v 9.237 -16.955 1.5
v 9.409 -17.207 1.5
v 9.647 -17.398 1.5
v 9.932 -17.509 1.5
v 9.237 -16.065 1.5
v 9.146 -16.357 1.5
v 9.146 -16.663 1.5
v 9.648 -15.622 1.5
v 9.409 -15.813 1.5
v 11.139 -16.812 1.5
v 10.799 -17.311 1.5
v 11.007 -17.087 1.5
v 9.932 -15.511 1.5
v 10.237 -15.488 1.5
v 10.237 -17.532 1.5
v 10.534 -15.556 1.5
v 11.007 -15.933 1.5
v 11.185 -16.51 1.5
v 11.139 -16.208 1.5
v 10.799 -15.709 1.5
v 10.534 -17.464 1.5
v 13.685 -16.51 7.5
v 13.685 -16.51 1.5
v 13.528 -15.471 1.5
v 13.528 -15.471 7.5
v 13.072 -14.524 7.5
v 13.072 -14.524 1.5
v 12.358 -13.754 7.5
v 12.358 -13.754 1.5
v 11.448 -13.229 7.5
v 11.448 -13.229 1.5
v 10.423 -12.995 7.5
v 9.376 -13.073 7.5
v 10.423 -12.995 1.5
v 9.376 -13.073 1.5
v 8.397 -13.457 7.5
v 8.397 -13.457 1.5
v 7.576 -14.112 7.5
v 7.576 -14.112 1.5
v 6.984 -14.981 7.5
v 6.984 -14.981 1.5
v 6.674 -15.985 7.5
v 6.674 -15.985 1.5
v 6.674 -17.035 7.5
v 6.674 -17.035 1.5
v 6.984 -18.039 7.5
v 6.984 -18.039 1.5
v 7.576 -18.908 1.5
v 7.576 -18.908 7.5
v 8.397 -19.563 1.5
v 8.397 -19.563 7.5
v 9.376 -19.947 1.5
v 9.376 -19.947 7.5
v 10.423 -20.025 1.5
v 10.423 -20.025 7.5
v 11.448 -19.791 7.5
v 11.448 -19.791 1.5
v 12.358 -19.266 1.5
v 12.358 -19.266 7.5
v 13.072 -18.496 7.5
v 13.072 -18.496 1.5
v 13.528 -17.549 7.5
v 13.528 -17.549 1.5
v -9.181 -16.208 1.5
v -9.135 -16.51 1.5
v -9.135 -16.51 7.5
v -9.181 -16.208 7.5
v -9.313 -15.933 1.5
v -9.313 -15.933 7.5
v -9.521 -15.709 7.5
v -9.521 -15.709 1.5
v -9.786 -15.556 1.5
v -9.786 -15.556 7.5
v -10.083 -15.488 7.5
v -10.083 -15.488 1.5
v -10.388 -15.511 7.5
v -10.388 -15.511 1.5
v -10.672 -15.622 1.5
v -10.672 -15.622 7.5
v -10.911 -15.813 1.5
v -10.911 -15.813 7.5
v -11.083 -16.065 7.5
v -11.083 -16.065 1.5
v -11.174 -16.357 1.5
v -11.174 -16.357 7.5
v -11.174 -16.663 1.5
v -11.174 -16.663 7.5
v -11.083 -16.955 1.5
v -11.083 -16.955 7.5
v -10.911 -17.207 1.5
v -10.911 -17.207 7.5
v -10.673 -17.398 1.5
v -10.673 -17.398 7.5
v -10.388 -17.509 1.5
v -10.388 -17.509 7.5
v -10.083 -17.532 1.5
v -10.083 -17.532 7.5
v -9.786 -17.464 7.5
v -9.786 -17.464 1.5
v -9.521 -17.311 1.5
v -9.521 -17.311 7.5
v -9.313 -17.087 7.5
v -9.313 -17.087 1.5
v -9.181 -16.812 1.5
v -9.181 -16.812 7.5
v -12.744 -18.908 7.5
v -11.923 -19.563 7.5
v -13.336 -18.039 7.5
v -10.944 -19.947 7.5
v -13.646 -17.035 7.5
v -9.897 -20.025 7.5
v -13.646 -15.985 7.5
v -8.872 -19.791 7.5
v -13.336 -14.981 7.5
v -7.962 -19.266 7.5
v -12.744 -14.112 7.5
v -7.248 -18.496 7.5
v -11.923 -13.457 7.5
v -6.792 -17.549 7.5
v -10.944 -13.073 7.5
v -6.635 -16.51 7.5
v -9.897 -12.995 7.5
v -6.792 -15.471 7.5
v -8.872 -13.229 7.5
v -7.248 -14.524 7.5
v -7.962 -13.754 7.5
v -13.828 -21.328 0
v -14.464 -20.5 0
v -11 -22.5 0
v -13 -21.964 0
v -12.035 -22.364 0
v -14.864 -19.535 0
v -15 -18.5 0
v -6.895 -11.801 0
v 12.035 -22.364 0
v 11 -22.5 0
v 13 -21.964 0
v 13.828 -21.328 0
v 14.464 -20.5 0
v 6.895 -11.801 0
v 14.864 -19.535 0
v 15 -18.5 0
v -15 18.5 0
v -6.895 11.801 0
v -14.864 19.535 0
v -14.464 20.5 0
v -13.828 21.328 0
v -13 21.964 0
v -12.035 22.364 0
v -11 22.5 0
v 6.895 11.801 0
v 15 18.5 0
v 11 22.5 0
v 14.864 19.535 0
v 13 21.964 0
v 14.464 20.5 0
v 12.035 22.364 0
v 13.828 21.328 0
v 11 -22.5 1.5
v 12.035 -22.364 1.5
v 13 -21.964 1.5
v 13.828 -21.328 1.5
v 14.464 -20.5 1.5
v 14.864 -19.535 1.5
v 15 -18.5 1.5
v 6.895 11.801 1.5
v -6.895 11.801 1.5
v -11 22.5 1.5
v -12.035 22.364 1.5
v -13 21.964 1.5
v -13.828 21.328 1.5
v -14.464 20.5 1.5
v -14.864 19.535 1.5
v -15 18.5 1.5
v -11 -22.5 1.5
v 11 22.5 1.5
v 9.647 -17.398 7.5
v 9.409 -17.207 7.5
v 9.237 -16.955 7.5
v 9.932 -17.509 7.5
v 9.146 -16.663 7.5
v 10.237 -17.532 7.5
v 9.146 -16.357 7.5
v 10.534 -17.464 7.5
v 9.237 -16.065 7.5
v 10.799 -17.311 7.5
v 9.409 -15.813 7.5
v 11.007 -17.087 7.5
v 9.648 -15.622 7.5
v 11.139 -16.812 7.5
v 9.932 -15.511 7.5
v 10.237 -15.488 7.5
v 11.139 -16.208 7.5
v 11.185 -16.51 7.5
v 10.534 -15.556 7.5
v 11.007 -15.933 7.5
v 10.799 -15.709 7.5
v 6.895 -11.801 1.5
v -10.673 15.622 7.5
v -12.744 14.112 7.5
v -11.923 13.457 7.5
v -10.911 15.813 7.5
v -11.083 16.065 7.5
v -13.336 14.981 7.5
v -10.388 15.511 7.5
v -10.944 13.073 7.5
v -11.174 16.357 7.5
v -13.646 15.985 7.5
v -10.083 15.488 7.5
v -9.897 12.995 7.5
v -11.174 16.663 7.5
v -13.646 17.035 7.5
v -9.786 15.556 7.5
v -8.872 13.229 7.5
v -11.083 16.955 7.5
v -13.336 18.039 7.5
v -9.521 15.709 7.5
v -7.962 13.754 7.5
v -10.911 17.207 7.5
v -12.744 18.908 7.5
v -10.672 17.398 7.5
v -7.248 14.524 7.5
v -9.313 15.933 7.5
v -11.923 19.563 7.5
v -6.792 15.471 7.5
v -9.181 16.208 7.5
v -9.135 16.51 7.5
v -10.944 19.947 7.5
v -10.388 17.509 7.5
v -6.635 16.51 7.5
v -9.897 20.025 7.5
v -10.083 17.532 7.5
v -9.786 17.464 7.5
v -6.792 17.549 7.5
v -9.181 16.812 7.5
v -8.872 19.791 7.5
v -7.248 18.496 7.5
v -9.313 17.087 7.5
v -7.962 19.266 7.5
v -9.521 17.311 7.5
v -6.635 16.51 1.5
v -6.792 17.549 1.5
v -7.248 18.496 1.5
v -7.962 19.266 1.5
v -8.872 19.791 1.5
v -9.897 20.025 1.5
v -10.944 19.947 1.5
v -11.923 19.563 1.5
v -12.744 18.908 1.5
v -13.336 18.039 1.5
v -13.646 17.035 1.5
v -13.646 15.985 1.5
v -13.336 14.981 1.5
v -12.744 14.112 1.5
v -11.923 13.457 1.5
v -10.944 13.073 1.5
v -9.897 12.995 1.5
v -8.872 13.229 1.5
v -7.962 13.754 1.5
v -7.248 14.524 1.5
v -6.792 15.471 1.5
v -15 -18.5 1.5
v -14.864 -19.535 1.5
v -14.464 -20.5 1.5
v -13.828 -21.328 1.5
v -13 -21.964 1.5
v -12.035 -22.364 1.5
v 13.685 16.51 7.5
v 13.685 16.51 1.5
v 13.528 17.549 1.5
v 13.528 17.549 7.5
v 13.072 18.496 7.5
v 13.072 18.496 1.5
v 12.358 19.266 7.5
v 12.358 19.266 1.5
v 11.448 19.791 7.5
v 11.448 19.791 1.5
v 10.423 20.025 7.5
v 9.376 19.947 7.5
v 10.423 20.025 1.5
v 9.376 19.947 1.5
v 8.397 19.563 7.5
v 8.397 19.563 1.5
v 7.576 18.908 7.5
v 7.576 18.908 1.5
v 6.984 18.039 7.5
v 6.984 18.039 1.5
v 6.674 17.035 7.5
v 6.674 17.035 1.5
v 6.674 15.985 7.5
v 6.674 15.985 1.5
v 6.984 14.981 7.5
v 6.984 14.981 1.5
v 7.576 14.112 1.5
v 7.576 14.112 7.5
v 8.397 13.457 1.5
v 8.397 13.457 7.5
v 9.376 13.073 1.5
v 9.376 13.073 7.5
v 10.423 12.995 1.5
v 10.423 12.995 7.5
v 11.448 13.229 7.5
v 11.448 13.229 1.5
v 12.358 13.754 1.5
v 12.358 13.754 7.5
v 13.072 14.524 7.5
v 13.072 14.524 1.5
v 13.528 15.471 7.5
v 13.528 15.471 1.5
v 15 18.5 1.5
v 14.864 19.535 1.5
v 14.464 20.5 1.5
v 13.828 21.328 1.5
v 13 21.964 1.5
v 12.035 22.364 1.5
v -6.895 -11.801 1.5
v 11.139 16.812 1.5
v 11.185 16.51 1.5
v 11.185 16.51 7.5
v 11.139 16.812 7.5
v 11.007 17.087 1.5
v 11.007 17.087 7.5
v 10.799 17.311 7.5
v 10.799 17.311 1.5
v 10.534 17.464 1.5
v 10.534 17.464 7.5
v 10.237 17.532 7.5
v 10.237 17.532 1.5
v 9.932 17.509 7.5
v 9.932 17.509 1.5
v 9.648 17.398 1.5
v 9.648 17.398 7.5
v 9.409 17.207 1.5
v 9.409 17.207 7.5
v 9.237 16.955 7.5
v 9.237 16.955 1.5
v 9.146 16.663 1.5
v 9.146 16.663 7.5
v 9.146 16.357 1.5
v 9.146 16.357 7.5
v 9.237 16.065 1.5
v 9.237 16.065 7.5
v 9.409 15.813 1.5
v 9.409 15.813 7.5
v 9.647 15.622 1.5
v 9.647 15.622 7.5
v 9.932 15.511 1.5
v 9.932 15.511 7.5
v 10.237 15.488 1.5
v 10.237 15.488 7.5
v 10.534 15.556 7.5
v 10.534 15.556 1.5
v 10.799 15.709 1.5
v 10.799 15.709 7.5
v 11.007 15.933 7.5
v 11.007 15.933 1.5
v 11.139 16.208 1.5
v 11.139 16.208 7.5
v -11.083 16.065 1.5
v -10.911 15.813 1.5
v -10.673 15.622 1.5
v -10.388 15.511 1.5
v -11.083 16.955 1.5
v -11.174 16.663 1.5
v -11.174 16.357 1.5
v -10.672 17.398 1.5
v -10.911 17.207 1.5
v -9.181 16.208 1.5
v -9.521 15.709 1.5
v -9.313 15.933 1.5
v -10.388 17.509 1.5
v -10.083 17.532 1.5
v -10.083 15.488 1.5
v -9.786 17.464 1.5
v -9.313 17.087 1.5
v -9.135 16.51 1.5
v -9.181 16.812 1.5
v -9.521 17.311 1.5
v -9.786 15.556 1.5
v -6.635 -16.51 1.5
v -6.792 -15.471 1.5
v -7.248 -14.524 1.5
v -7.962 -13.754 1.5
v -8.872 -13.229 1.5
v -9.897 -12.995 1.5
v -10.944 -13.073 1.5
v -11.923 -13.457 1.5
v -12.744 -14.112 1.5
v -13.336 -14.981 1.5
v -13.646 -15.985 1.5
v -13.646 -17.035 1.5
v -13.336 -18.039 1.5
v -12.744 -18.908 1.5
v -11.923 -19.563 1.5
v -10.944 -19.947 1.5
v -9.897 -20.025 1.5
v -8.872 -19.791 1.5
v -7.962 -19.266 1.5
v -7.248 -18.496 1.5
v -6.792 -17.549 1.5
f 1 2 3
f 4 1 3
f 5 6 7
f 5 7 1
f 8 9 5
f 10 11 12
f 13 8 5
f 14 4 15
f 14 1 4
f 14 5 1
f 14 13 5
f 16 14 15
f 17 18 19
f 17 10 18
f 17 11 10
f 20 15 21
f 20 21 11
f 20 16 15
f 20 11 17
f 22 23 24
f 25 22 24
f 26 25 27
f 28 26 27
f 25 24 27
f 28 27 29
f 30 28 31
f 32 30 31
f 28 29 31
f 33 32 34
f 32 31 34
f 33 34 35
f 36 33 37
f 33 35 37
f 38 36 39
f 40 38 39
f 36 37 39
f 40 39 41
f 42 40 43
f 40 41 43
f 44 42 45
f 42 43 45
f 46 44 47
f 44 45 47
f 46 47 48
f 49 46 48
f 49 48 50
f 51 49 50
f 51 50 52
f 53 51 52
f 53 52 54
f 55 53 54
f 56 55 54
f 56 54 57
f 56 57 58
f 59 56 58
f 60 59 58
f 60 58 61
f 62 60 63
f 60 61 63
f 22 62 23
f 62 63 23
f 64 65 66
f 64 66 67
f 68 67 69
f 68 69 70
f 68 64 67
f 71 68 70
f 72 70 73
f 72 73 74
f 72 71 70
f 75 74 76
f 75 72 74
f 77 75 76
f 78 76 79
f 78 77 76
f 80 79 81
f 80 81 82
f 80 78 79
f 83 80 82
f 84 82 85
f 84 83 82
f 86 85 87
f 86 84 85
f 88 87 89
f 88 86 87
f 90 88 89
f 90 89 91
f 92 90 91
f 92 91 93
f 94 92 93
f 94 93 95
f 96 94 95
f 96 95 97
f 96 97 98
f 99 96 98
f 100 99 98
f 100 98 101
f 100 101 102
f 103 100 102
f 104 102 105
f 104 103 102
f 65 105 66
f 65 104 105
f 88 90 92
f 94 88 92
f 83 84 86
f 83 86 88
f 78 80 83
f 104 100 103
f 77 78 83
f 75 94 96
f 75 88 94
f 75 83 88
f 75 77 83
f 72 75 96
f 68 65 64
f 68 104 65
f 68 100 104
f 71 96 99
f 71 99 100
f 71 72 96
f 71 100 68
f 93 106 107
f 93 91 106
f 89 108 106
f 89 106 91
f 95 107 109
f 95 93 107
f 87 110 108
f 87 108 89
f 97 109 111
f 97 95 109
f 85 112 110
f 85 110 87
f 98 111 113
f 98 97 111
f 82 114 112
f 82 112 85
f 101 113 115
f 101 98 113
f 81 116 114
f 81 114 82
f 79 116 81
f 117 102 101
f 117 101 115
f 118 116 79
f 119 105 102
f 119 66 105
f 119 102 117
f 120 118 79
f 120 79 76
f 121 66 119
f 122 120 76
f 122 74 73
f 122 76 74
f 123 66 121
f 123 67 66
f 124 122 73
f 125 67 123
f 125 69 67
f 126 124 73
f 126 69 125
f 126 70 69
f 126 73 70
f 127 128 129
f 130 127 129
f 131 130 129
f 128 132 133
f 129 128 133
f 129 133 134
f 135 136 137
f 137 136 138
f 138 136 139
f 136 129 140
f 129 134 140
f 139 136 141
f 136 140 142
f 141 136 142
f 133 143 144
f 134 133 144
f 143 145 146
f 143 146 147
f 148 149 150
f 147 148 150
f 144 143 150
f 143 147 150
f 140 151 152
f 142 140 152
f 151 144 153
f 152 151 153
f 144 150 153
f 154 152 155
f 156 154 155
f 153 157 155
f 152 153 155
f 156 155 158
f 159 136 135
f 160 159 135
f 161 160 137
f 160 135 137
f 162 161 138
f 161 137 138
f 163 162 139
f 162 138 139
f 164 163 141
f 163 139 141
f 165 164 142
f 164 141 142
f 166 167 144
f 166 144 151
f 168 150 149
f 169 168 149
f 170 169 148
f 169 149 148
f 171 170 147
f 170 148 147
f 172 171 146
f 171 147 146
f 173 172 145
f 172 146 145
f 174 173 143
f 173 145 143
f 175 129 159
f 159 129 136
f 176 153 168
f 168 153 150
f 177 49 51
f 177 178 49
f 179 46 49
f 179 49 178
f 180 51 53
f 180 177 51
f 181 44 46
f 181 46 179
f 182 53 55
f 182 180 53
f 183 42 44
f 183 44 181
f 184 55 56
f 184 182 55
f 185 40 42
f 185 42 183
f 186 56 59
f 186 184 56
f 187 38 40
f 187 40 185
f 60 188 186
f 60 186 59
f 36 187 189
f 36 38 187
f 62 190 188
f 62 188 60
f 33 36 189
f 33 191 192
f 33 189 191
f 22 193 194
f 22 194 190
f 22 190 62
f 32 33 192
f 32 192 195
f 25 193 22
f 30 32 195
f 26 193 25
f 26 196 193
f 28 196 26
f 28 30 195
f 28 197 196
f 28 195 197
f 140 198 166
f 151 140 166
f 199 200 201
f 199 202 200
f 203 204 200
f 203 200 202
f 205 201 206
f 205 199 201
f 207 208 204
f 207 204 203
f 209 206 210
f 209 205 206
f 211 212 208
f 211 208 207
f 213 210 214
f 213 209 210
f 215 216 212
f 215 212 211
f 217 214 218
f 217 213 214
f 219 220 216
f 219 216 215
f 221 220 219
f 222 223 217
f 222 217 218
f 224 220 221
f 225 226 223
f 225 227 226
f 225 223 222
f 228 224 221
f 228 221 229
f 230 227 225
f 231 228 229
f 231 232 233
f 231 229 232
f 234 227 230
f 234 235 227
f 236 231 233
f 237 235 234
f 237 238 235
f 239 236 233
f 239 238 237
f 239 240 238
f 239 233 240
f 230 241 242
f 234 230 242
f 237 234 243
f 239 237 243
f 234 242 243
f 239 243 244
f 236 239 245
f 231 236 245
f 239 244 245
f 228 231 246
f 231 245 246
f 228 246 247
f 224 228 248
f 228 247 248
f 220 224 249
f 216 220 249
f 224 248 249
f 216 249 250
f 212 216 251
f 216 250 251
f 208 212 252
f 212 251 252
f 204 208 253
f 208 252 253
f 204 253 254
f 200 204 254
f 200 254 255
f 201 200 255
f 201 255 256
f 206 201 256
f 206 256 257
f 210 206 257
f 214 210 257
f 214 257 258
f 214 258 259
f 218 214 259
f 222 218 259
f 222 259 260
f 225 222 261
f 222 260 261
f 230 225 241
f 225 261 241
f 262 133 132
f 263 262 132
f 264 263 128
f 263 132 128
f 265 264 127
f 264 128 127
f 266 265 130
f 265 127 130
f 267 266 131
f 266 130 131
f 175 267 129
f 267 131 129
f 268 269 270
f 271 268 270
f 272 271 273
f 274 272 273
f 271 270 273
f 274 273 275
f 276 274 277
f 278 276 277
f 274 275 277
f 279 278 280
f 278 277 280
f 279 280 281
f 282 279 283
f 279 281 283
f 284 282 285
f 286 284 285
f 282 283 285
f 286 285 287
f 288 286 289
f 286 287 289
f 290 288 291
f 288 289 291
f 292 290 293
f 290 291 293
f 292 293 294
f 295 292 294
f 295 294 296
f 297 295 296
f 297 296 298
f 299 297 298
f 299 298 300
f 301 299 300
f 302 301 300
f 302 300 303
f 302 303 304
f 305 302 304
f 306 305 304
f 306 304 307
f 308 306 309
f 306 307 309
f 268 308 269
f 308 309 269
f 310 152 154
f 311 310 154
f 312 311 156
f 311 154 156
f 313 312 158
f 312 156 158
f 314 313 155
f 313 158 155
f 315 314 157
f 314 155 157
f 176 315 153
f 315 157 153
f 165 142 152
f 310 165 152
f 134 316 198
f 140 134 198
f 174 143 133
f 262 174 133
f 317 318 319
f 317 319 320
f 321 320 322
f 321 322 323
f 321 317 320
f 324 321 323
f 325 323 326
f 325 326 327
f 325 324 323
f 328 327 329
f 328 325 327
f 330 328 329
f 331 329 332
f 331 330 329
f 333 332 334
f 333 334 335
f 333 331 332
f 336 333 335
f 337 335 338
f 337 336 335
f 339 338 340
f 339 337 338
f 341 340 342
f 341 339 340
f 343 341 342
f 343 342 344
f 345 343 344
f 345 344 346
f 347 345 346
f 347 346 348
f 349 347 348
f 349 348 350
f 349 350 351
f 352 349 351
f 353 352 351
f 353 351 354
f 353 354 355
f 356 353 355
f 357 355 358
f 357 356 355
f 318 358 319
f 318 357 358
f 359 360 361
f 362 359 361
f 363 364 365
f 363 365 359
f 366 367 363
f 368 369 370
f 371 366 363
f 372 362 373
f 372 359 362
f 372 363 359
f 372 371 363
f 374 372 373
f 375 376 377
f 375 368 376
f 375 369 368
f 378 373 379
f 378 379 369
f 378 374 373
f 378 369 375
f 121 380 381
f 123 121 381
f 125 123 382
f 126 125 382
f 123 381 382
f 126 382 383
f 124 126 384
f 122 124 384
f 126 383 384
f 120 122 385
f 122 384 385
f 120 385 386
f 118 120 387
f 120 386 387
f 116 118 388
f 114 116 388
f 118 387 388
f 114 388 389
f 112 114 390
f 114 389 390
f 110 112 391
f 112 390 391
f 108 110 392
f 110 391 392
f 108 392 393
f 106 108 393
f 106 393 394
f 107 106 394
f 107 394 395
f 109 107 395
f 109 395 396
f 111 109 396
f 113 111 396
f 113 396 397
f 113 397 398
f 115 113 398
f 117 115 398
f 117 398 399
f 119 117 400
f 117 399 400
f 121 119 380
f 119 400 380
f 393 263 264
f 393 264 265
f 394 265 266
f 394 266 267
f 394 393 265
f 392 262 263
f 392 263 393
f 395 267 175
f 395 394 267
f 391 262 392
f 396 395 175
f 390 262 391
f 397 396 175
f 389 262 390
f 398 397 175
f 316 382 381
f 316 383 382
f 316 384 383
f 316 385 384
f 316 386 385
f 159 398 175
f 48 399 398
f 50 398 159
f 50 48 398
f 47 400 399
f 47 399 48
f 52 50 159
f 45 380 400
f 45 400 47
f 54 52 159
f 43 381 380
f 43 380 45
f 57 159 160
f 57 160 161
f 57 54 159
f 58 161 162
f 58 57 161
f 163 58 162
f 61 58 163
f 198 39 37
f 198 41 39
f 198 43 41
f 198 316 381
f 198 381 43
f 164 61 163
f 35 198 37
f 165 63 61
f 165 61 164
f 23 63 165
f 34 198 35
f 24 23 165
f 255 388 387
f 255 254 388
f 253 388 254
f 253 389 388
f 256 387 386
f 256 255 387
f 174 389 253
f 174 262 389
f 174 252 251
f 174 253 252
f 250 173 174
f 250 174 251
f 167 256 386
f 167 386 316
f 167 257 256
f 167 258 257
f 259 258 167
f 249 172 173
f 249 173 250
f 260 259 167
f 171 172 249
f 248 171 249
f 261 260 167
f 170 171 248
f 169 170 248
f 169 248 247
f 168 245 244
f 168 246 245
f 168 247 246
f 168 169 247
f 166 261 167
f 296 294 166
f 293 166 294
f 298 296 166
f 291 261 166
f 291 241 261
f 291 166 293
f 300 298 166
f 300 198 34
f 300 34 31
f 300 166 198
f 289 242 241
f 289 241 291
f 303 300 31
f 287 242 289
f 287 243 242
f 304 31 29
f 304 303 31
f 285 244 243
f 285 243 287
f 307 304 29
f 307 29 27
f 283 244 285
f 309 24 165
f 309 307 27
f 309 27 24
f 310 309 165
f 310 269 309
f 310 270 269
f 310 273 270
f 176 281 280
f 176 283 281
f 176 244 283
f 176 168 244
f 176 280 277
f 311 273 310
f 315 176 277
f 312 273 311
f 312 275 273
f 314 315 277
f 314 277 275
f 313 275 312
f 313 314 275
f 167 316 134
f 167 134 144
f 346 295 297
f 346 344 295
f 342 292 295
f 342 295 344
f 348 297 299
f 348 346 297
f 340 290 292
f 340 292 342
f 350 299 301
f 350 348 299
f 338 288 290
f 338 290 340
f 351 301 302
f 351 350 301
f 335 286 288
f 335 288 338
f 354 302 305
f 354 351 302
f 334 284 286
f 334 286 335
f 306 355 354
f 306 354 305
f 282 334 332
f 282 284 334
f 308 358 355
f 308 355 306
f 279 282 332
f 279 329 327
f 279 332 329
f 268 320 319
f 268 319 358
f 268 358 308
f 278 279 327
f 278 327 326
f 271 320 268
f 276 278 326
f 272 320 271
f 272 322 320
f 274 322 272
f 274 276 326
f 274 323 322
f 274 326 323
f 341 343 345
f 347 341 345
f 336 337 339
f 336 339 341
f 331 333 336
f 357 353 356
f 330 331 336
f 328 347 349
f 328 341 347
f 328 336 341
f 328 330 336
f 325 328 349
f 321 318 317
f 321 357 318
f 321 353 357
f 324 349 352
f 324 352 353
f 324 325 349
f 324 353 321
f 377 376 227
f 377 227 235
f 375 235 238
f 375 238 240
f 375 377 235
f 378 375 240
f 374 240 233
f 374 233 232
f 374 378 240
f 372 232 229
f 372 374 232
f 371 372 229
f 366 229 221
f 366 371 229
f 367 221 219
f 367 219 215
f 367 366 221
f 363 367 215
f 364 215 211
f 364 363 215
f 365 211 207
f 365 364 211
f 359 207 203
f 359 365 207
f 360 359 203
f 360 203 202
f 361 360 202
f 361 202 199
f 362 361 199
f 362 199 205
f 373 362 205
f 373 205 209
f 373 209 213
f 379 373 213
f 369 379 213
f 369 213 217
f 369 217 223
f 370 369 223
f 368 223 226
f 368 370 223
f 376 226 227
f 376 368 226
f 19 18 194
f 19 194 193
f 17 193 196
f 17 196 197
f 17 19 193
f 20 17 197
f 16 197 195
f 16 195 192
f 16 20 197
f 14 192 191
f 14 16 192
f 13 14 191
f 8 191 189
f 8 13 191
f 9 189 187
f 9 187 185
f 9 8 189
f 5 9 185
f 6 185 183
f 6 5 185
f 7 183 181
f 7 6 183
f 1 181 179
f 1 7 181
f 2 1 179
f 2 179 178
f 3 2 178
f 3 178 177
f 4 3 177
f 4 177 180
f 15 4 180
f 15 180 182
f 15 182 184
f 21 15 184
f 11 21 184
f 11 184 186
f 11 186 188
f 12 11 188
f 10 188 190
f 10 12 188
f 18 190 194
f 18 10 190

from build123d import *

# Parameters (mm, degrees)
F1_DEPTH = 1.5
F2_R     = 3.525
F2_R_2   = 1.025
F3_DEPTH = 6
F4_W     = 13.78999
F4_H     = 23.601498
F5_DEPTH = 2


with BuildPart() as f1:
    # F0 (on Top) → F1 (new body)
    with BuildSketch(Plane.XY):
        with BuildLine():
            Line((11, 22.5), (-11, 22.5))
            ThreePointArc((-11, 22.5), (-13.828427, 21.328427), (-15, 18.5))
            Line((-15, 18.5), (-15, -18.5))
            ThreePointArc((-15, -18.5), (-13.828427, -21.328427), (-11, -22.5))
            Line((-11, -22.5), (11, -22.5))
            ThreePointArc((11, -22.5), (13.828427, -21.328427), (15, -18.5))
            Line((15, -18.5), (15, 18.5))
            ThreePointArc((15, 18.5), (13.828427, 21.328427), (11, 22.5))
        make_face()
    extrude(amount=F1_DEPTH)

    # F2 (on face) → F3 (join)
    with BuildSketch(Plane.XY.offset(1.5)):
        with Locations((-10.16, 16.51)):
            Circle(F2_R)
        with Locations((-10.16, 16.51)):
            Circle(F2_R_2, mode=Mode.SUBTRACT)
        with Locations((10.16, 16.51)):
            Circle(F2_R)
        with Locations((10.16, 16.51)):
            Circle(F2_R_2, mode=Mode.SUBTRACT)
        with Locations((-10.16, -16.51)):
            Circle(F2_R)
        with Locations((-10.16, -16.51)):
            Circle(F2_R_2, mode=Mode.SUBTRACT)
        with Locations((10.16, -16.51)):
            Circle(F2_R)
        with Locations((10.16, -16.51)):
            Circle(F2_R_2, mode=Mode.SUBTRACT)
    extrude(amount=F3_DEPTH)

    # F4 (on face) → F5 (cut)
    with BuildSketch(Plane.XY.offset(1.5)):
        Rectangle(F4_W, F4_H)
    extrude(amount=-F5_DEPTH, mode=Mode.SUBTRACT)


solid = f1.part
